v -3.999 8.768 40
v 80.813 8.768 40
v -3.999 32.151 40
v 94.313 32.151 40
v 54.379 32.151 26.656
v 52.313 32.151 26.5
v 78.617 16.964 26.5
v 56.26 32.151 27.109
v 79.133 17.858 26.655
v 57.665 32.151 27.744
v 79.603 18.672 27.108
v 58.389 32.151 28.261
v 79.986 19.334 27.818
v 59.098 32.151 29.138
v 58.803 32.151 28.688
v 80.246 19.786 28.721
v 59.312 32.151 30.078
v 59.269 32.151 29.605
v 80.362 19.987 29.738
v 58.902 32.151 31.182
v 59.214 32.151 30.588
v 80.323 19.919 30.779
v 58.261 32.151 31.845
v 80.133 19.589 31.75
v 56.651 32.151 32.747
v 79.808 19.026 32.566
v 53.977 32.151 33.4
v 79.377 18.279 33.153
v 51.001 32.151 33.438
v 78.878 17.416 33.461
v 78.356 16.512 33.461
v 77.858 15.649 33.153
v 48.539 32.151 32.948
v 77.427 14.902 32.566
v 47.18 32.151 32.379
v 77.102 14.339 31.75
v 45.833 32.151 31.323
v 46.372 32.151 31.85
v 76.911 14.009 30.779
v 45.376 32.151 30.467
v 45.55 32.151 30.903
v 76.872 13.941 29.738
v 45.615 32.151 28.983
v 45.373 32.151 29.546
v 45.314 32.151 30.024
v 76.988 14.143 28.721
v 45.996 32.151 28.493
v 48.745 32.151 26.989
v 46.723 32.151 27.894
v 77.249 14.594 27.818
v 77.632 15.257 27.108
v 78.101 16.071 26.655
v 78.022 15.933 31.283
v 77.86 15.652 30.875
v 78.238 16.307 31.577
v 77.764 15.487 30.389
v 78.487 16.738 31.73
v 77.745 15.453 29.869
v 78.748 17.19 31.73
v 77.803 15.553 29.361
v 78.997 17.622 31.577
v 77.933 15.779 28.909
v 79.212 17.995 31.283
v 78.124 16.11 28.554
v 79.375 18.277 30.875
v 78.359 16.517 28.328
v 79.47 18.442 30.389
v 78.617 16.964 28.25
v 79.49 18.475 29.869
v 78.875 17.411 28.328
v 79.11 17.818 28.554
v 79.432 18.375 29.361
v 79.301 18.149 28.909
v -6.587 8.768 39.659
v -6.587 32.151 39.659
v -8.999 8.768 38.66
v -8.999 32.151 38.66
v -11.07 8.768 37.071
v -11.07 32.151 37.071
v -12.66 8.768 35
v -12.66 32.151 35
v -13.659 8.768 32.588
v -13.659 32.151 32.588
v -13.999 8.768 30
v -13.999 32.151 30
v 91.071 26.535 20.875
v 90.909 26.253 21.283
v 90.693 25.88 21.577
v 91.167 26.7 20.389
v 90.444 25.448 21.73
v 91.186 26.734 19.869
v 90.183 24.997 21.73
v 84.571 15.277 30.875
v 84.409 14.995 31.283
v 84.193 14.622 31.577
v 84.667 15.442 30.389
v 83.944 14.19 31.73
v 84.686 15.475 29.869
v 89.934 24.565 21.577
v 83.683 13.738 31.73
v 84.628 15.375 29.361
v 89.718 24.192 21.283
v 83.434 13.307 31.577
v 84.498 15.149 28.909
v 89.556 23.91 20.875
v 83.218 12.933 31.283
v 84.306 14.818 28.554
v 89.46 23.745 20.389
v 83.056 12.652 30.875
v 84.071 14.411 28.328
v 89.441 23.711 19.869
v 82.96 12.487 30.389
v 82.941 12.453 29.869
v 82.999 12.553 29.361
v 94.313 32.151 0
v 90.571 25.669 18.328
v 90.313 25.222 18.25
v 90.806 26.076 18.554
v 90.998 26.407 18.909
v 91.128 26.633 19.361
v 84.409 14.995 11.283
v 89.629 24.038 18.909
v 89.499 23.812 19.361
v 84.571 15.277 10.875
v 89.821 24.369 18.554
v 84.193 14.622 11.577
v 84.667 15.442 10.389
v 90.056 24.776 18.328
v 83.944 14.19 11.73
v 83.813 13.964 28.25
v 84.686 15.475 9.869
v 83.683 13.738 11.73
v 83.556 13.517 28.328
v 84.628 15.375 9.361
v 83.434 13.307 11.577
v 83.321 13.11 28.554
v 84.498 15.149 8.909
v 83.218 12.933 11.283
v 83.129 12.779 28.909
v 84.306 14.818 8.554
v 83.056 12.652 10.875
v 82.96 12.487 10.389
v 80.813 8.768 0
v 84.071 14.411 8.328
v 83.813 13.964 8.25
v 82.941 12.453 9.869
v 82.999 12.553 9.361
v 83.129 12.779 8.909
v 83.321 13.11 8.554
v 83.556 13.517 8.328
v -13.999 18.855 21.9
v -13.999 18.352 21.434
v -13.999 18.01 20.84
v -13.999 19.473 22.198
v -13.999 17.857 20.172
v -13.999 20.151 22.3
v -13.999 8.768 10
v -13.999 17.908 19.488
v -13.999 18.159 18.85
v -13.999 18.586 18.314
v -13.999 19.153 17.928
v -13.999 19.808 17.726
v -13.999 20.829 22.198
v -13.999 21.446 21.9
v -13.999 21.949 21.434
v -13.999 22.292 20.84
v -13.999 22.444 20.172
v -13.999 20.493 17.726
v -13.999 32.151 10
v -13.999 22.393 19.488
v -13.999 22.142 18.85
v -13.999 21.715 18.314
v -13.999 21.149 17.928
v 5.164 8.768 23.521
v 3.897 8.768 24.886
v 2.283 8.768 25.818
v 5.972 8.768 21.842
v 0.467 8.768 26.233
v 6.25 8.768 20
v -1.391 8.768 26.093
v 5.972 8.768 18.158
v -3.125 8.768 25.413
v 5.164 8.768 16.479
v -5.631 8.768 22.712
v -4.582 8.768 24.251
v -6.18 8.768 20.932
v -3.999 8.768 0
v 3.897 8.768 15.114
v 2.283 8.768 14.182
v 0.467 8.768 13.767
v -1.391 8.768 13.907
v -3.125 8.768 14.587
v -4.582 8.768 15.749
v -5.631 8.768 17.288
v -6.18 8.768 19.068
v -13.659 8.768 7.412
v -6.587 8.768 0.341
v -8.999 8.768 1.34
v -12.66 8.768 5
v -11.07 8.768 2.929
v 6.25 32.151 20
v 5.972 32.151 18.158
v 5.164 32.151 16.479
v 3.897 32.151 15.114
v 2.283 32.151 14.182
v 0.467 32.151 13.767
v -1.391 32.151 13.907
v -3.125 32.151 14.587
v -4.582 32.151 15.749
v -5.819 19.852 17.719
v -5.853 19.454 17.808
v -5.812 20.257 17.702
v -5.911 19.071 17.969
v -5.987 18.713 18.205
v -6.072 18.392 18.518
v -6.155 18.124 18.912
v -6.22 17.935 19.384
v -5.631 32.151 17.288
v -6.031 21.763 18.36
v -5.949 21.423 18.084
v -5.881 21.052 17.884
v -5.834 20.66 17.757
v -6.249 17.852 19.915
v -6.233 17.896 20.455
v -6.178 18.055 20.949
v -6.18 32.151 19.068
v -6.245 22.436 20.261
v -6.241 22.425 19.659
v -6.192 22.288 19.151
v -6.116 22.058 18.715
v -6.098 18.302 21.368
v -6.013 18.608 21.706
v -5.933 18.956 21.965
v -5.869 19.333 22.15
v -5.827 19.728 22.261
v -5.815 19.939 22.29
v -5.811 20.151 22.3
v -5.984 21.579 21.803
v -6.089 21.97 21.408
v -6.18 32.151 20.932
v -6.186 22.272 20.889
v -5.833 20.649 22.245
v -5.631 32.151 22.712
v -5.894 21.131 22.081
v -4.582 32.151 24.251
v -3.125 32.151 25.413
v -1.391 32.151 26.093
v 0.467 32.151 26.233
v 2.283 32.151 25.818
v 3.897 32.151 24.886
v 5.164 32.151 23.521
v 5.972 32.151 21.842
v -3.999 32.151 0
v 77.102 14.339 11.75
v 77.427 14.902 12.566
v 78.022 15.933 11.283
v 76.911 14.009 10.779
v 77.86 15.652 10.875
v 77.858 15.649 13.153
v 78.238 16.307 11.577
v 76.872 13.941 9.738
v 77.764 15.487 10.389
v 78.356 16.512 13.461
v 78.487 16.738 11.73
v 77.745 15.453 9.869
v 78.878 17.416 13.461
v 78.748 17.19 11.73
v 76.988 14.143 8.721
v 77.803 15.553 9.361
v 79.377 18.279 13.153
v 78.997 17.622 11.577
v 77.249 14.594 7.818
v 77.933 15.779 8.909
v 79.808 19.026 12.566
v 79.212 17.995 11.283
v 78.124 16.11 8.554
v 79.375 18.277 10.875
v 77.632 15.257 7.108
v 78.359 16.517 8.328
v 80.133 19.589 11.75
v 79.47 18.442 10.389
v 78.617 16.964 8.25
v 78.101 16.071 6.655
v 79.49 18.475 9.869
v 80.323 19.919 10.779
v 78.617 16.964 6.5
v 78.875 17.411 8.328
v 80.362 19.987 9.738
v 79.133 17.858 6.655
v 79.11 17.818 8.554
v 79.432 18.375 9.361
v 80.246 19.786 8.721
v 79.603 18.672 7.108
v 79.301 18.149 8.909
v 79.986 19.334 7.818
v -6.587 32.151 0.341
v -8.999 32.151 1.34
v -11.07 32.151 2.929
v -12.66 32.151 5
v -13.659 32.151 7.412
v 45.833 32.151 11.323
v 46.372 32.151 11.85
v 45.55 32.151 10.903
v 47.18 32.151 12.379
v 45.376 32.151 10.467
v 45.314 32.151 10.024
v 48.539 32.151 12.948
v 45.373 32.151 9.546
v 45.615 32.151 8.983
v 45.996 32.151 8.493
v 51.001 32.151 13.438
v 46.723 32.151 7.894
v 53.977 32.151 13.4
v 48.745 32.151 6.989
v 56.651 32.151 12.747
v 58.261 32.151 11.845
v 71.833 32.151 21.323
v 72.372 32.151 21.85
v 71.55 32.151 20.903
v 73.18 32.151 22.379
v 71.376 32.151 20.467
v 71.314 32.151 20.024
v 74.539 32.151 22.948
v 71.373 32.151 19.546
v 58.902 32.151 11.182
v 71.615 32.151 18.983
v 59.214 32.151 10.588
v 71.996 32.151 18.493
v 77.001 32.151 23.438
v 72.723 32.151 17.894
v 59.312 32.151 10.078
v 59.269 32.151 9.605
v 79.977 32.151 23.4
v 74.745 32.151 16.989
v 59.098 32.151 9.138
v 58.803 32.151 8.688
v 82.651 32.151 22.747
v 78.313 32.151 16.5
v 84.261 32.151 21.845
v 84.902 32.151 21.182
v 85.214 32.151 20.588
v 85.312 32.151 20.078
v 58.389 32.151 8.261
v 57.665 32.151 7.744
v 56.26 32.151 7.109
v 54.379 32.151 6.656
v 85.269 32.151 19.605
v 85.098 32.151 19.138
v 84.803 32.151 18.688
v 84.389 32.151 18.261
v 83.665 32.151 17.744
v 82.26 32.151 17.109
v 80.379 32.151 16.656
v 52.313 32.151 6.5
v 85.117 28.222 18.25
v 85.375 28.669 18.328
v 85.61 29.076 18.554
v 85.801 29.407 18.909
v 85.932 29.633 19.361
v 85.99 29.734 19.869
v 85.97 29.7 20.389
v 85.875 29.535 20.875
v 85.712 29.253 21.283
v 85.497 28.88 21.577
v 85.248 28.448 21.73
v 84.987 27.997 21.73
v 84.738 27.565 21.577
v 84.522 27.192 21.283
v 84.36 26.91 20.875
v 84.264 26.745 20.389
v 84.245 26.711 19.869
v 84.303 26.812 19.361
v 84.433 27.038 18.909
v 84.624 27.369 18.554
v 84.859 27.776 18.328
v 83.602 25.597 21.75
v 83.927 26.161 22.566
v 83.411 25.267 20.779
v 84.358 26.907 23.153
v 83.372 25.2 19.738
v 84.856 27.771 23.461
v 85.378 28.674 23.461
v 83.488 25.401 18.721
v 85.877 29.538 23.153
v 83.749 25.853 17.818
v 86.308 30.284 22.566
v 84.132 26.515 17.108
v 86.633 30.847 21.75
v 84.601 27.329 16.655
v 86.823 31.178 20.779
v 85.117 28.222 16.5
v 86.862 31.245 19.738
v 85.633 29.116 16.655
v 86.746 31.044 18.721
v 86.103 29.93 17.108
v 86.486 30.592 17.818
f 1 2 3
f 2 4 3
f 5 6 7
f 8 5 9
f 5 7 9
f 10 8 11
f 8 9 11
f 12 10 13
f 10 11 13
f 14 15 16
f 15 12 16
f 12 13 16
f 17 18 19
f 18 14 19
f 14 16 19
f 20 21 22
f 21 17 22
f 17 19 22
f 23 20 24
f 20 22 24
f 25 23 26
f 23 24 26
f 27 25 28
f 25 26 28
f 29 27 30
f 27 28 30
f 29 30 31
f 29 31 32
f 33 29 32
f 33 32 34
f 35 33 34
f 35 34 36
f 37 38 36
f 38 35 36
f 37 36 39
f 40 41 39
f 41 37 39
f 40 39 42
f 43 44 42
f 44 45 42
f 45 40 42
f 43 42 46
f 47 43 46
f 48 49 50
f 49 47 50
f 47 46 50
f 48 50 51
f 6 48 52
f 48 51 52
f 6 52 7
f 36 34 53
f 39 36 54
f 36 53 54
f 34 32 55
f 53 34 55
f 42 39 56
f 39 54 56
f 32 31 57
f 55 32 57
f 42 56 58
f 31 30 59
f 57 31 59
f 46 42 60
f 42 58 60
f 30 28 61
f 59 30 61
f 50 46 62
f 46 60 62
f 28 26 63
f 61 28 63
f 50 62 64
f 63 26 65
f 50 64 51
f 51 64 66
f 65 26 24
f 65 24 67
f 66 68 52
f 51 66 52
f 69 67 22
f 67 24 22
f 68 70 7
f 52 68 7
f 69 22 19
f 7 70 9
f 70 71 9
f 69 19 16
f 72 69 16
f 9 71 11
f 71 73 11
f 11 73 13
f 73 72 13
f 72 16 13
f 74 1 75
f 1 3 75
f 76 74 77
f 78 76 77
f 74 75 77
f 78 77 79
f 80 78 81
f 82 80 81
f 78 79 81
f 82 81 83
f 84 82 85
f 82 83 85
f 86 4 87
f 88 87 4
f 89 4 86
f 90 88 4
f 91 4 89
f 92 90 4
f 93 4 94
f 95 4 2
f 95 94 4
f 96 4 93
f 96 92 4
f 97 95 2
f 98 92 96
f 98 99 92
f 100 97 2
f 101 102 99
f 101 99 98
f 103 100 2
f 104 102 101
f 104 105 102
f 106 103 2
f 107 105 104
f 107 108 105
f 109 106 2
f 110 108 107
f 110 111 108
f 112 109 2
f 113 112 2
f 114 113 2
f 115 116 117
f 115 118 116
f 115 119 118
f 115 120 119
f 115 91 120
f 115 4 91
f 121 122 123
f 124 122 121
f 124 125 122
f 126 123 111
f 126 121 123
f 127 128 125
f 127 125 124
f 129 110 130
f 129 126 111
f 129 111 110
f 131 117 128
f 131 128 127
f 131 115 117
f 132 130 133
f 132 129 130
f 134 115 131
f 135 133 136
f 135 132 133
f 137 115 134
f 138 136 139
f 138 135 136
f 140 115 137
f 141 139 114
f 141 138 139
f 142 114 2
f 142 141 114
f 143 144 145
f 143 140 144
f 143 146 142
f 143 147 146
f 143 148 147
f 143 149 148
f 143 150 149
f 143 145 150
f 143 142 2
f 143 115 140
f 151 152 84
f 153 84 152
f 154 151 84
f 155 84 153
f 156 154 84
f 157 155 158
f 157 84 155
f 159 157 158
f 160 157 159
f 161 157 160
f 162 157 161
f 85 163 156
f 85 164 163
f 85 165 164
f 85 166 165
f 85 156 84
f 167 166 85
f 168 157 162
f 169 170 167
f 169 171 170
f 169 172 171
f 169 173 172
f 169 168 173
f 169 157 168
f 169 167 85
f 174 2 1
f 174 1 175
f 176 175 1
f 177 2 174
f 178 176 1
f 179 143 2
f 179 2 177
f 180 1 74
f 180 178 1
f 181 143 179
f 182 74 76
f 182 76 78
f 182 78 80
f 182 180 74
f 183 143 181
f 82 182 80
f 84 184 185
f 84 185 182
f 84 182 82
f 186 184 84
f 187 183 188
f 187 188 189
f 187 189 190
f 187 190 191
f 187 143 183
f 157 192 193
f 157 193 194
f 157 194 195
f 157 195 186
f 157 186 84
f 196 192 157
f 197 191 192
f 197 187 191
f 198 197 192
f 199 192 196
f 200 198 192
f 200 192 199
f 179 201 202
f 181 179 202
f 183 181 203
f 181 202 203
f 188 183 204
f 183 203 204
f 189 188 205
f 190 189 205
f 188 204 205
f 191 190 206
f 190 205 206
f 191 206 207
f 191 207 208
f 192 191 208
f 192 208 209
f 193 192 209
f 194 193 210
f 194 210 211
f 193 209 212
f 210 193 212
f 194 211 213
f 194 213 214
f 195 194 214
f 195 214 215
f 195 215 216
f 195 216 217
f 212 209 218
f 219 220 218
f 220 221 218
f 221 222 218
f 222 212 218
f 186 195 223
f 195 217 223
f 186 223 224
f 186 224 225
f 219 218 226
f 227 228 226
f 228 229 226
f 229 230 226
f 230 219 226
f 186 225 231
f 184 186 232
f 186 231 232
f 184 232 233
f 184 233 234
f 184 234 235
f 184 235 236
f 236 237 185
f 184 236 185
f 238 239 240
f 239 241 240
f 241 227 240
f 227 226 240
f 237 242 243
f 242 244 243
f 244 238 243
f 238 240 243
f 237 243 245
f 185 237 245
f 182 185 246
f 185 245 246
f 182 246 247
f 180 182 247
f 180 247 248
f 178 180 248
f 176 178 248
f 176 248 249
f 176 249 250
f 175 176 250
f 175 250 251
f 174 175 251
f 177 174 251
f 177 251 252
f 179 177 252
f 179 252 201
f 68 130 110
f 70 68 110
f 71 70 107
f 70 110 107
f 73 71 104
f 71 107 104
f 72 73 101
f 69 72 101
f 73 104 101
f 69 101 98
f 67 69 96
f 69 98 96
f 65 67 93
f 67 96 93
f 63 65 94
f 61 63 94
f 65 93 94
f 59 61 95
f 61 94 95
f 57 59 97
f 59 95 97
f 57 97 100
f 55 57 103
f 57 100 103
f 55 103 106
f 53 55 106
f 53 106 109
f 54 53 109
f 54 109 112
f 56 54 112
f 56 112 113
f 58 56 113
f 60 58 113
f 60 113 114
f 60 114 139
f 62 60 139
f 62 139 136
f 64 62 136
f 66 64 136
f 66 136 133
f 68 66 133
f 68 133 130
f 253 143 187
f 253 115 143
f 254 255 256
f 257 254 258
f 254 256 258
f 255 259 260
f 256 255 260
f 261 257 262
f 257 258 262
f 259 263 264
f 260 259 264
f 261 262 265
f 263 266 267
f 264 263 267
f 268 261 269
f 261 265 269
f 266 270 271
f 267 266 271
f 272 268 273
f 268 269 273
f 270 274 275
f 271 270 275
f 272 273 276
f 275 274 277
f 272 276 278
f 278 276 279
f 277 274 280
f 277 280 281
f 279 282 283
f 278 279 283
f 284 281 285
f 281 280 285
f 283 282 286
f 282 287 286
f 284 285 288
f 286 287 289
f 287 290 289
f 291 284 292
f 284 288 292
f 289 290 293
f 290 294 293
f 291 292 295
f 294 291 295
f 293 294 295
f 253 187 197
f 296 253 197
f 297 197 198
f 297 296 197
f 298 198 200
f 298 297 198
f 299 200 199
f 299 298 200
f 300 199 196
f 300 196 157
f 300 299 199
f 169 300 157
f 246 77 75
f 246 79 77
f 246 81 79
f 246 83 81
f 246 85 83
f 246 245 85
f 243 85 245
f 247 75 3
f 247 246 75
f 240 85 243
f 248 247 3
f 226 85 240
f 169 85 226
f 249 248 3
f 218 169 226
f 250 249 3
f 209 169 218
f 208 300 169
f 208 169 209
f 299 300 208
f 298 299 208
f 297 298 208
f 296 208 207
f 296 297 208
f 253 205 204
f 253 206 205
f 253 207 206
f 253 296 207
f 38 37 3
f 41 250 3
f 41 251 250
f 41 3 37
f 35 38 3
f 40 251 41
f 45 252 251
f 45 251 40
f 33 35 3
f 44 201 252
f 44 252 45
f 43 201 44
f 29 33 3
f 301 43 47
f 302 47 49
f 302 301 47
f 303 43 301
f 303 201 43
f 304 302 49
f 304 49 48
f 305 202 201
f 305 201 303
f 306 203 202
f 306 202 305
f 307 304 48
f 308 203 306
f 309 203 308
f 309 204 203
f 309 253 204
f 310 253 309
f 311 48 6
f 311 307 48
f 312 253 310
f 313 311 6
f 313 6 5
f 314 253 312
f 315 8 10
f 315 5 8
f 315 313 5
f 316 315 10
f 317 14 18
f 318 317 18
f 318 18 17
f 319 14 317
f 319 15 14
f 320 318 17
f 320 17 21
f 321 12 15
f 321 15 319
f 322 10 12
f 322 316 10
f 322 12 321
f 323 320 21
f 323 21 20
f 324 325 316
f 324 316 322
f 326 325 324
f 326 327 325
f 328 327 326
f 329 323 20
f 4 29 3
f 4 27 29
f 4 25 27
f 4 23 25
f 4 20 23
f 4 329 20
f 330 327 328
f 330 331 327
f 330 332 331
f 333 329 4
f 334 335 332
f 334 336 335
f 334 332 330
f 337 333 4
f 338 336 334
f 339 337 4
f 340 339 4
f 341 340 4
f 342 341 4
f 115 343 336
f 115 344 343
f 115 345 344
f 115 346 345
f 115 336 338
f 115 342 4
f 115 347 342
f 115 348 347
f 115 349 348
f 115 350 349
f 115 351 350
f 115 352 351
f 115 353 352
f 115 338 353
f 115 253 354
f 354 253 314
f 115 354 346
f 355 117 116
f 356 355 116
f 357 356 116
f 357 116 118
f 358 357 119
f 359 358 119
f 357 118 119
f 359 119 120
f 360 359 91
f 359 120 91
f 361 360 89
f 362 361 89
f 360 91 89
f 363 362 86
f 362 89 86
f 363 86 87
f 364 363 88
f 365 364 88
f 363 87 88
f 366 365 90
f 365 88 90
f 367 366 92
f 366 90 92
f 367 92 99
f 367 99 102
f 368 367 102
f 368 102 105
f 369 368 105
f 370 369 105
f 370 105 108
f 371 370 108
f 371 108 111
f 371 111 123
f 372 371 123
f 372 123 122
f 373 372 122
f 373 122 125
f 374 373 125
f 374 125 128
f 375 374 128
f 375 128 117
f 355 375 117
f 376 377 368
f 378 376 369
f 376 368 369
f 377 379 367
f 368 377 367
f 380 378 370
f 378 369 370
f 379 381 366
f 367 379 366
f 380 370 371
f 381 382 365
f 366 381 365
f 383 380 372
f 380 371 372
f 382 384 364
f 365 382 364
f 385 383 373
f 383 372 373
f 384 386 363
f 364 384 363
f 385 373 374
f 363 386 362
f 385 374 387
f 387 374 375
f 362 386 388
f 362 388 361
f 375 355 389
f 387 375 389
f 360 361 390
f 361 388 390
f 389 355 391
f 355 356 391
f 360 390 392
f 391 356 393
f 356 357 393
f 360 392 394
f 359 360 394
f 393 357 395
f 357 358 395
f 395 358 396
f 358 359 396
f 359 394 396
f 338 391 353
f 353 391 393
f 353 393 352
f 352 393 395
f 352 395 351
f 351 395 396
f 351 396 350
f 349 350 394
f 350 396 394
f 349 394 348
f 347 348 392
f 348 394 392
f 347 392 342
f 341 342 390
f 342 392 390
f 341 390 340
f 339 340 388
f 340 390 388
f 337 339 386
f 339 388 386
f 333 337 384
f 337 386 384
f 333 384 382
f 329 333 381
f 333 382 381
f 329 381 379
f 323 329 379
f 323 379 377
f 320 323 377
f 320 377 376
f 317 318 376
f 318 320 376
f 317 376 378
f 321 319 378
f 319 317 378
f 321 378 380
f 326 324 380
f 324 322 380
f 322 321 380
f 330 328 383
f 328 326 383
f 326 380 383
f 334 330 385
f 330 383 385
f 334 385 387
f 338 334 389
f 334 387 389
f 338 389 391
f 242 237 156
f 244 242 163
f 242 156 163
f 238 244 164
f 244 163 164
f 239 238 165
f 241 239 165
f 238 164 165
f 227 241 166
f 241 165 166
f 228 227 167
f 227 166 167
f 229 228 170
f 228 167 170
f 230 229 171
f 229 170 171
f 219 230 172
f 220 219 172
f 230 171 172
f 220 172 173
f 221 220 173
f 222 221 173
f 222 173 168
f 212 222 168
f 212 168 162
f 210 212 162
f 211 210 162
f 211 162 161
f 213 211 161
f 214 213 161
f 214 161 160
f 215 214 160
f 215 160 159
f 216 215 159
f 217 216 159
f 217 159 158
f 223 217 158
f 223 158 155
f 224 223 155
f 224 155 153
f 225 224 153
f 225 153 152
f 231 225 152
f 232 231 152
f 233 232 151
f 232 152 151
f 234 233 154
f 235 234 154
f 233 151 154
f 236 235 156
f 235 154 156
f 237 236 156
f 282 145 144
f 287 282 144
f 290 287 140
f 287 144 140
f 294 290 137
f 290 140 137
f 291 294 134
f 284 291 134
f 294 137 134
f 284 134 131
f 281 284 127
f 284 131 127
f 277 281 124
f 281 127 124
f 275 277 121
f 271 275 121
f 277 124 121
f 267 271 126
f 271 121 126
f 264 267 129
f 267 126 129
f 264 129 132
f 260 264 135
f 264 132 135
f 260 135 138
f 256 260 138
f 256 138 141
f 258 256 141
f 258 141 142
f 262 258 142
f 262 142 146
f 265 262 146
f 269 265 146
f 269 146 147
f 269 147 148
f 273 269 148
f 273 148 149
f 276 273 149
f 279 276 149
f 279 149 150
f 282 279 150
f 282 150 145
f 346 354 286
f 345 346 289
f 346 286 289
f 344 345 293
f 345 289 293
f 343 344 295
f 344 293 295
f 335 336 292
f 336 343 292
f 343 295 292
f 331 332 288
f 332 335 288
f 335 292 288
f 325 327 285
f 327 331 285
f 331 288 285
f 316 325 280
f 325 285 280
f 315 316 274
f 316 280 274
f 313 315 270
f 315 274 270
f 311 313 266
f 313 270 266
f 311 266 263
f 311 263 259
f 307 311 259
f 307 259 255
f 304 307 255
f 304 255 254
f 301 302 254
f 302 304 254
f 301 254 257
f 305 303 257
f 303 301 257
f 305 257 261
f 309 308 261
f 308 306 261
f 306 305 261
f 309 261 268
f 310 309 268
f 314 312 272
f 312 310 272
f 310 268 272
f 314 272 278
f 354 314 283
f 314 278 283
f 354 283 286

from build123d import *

# Parameters (mm, degrees)
SALIENTE_EXTRUIR1_DEPTH = 40
CORTAR_EXTRUIR1_REACH   = 25.383
CROQUIS2_R              = 6.25
REDONDEO1_R             = 10
CORTAR_EXTRUIR2_REACH   = 110.313
CROQUIS3_R              = 2.3
CORTAR_EXTRUIR3_REACH   = 95.802
CROQUIS4_R              = 1.75
CORTAR_EXTRUIR4_REACH   = 89.802
CROQUIS5_R              = 3.5


with BuildPart() as part:
    # Croquis1 → Saliente-Extruir1 (new body)
    with BuildSketch(Plane.XY):
        Polygon((80.813466521, 8.767949192), (-13.999287239, 8.767949192), (-13.999287239, 32.150635095), (94.313466521, 32.150635095), align=None)
    extrude(amount=SALIENTE_EXTRUIR1_DEPTH)

    # Croquis2 → Cortar-Extruir1 (cut, up to next)
    with BuildSketch(Plane(origin=(0, 32.150635095, 0), x_dir=(1, 0, 0), z_dir=(0, 1, 0)), mode=Mode.PRIVATE) as cortar_extruir1_sk1:
        with Locations((0, -20)):
            Circle(CROQUIS2_R)
    cortar_extruir1_tool1 = extrude(cortar_extruir1_sk1.sketch, amount=-CORTAR_EXTRUIR1_REACH, mode=Mode.PRIVATE) & part.part
    add(cortar_extruir1_tool1.solids().sort_by_distance((0, 32.150635, 20))[0], mode=Mode.SUBTRACT)

    # Redondeo1
    redondeo1_edges = [part.edges().sort_by_distance(p)[0] for p in [
        (-13.999287239, 20.459292144, 0),
        (-13.999287239, 20.459292144, 40),
    ]]
    fillet(redondeo1_edges, radius=REDONDEO1_R)

    # Croquis3 → Cortar-Extruir2 (cut, up to next)
    with BuildSketch(Plane.ZY.offset(13.999287239), mode=Mode.PRIVATE) as cortar_extruir2_sk1:
        with Locations((20, 20.150635095)):
            Circle(CROQUIS3_R)
    cortar_extruir2_tool1 = extrude(cortar_extruir2_sk1.sketch, amount=-CORTAR_EXTRUIR2_REACH, mode=Mode.PRIVATE) & part.part
    add(cortar_extruir2_tool1.solids().sort_by_distance((-13.999287, 20.150635, 20))[0], mode=Mode.SUBTRACT)

    # Croquis4 → Cortar-Extruir3 (cut, up to next)
    with BuildSketch(Plane(origin=(56.813466521, -32.801270189, 0), x_dir=(0, 0, -1), z_dir=(0.866025404, -0.5, 0)), mode=Mode.PRIVATE) as cortar_extruir3_sk1:
        with Locations((-30, 54)):
            Circle(CROQUIS4_R)
    cortar_extruir3_tool1 = extrude(cortar_extruir3_sk1.sketch, amount=-CORTAR_EXTRUIR3_REACH, mode=Mode.PRIVATE) & part.part
    add(cortar_extruir3_tool1.solids().sort_by_distance((83.813467, 13.964102, 30))[0], mode=Mode.SUBTRACT)
    # Croquis4 → Cortar-Extruir3 (cut, up to next)
    with BuildSketch(Plane(origin=(56.813466521, -32.801270189, 0), x_dir=(0, 0, -1), z_dir=(0.866025404, -0.5, 0)), mode=Mode.PRIVATE) as cortar_extruir3_sk2:
        with Locations((-10, 54)):
            Circle(CROQUIS4_R)
    cortar_extruir3_tool2 = extrude(cortar_extruir3_sk2.sketch, amount=-CORTAR_EXTRUIR3_REACH, mode=Mode.PRIVATE) & part.part
    add(cortar_extruir3_tool2.solids().sort_by_distance((83.813467, 13.964102, 10))[0], mode=Mode.SUBTRACT)
    # Croquis4 → Cortar-Extruir3 (cut, up to next)
    with BuildSketch(Plane(origin=(56.813466521, -32.801270189, 0), x_dir=(0, 0, -1), z_dir=(0.866025404, -0.5, 0)), mode=Mode.PRIVATE) as cortar_extruir3_sk3:
        with Locations((-20, 67)):
            Circle(CROQUIS4_R)
    cortar_extruir3_tool3 = extrude(cortar_extruir3_sk3.sketch, amount=-CORTAR_EXTRUIR3_REACH, mode=Mode.PRIVATE) & part.part
    add(cortar_extruir3_tool3.solids().sort_by_distance((90.313467, 25.222432, 20))[0], mode=Mode.SUBTRACT)

    # Croquis5 → Cortar-Extruir4 (cut, up to next)
    with BuildSketch(Plane(origin=(51.617314098, -29.801270189, 0), x_dir=(0, 0, -1), z_dir=(0.866025404, -0.5, 0)), mode=Mode.PRIVATE) as cortar_extruir4_sk1:
        with Locations((-30, 54)):
            Circle(CROQUIS5_R)
    cortar_extruir4_tool1 = extrude(cortar_extruir4_sk1.sketch, amount=-CORTAR_EXTRUIR4_REACH, mode=Mode.PRIVATE) & part.part
    add(cortar_extruir4_tool1.solids().sort_by_distance((78.617314, 16.964102, 30))[0], mode=Mode.SUBTRACT)
    # Croquis5 → Cortar-Extruir4 (cut, up to next)
    with BuildSketch(Plane(origin=(51.617314098, -29.801270189, 0), x_dir=(0, 0, -1), z_dir=(0.866025404, -0.5, 0)), mode=Mode.PRIVATE) as cortar_extruir4_sk2:
        with Locations((-20, 67)):
            Circle(CROQUIS5_R)
    cortar_extruir4_tool2 = extrude(cortar_extruir4_sk2.sketch, amount=-CORTAR_EXTRUIR4_REACH, mode=Mode.PRIVATE) & part.part
    add(cortar_extruir4_tool2.solids().sort_by_distance((85.117314, 28.222432, 20))[0], mode=Mode.SUBTRACT)
    # Croquis5 → Cortar-Extruir4 (cut, up to next)
    with BuildSketch(Plane(origin=(51.617314098, -29.801270189, 0), x_dir=(0, 0, -1), z_dir=(0.866025404, -0.5, 0)), mode=Mode.PRIVATE) as cortar_extruir4_sk3:
        with Locations((-10, 54)):
            Circle(CROQUIS5_R)
    cortar_extruir4_tool3 = extrude(cortar_extruir4_sk3.sketch, amount=-CORTAR_EXTRUIR4_REACH, mode=Mode.PRIVATE) & part.part
    add(cortar_extruir4_tool3.solids().sort_by_distance((78.617314, 16.964102, 10))[0], mode=Mode.SUBTRACT)


solid = part.part
